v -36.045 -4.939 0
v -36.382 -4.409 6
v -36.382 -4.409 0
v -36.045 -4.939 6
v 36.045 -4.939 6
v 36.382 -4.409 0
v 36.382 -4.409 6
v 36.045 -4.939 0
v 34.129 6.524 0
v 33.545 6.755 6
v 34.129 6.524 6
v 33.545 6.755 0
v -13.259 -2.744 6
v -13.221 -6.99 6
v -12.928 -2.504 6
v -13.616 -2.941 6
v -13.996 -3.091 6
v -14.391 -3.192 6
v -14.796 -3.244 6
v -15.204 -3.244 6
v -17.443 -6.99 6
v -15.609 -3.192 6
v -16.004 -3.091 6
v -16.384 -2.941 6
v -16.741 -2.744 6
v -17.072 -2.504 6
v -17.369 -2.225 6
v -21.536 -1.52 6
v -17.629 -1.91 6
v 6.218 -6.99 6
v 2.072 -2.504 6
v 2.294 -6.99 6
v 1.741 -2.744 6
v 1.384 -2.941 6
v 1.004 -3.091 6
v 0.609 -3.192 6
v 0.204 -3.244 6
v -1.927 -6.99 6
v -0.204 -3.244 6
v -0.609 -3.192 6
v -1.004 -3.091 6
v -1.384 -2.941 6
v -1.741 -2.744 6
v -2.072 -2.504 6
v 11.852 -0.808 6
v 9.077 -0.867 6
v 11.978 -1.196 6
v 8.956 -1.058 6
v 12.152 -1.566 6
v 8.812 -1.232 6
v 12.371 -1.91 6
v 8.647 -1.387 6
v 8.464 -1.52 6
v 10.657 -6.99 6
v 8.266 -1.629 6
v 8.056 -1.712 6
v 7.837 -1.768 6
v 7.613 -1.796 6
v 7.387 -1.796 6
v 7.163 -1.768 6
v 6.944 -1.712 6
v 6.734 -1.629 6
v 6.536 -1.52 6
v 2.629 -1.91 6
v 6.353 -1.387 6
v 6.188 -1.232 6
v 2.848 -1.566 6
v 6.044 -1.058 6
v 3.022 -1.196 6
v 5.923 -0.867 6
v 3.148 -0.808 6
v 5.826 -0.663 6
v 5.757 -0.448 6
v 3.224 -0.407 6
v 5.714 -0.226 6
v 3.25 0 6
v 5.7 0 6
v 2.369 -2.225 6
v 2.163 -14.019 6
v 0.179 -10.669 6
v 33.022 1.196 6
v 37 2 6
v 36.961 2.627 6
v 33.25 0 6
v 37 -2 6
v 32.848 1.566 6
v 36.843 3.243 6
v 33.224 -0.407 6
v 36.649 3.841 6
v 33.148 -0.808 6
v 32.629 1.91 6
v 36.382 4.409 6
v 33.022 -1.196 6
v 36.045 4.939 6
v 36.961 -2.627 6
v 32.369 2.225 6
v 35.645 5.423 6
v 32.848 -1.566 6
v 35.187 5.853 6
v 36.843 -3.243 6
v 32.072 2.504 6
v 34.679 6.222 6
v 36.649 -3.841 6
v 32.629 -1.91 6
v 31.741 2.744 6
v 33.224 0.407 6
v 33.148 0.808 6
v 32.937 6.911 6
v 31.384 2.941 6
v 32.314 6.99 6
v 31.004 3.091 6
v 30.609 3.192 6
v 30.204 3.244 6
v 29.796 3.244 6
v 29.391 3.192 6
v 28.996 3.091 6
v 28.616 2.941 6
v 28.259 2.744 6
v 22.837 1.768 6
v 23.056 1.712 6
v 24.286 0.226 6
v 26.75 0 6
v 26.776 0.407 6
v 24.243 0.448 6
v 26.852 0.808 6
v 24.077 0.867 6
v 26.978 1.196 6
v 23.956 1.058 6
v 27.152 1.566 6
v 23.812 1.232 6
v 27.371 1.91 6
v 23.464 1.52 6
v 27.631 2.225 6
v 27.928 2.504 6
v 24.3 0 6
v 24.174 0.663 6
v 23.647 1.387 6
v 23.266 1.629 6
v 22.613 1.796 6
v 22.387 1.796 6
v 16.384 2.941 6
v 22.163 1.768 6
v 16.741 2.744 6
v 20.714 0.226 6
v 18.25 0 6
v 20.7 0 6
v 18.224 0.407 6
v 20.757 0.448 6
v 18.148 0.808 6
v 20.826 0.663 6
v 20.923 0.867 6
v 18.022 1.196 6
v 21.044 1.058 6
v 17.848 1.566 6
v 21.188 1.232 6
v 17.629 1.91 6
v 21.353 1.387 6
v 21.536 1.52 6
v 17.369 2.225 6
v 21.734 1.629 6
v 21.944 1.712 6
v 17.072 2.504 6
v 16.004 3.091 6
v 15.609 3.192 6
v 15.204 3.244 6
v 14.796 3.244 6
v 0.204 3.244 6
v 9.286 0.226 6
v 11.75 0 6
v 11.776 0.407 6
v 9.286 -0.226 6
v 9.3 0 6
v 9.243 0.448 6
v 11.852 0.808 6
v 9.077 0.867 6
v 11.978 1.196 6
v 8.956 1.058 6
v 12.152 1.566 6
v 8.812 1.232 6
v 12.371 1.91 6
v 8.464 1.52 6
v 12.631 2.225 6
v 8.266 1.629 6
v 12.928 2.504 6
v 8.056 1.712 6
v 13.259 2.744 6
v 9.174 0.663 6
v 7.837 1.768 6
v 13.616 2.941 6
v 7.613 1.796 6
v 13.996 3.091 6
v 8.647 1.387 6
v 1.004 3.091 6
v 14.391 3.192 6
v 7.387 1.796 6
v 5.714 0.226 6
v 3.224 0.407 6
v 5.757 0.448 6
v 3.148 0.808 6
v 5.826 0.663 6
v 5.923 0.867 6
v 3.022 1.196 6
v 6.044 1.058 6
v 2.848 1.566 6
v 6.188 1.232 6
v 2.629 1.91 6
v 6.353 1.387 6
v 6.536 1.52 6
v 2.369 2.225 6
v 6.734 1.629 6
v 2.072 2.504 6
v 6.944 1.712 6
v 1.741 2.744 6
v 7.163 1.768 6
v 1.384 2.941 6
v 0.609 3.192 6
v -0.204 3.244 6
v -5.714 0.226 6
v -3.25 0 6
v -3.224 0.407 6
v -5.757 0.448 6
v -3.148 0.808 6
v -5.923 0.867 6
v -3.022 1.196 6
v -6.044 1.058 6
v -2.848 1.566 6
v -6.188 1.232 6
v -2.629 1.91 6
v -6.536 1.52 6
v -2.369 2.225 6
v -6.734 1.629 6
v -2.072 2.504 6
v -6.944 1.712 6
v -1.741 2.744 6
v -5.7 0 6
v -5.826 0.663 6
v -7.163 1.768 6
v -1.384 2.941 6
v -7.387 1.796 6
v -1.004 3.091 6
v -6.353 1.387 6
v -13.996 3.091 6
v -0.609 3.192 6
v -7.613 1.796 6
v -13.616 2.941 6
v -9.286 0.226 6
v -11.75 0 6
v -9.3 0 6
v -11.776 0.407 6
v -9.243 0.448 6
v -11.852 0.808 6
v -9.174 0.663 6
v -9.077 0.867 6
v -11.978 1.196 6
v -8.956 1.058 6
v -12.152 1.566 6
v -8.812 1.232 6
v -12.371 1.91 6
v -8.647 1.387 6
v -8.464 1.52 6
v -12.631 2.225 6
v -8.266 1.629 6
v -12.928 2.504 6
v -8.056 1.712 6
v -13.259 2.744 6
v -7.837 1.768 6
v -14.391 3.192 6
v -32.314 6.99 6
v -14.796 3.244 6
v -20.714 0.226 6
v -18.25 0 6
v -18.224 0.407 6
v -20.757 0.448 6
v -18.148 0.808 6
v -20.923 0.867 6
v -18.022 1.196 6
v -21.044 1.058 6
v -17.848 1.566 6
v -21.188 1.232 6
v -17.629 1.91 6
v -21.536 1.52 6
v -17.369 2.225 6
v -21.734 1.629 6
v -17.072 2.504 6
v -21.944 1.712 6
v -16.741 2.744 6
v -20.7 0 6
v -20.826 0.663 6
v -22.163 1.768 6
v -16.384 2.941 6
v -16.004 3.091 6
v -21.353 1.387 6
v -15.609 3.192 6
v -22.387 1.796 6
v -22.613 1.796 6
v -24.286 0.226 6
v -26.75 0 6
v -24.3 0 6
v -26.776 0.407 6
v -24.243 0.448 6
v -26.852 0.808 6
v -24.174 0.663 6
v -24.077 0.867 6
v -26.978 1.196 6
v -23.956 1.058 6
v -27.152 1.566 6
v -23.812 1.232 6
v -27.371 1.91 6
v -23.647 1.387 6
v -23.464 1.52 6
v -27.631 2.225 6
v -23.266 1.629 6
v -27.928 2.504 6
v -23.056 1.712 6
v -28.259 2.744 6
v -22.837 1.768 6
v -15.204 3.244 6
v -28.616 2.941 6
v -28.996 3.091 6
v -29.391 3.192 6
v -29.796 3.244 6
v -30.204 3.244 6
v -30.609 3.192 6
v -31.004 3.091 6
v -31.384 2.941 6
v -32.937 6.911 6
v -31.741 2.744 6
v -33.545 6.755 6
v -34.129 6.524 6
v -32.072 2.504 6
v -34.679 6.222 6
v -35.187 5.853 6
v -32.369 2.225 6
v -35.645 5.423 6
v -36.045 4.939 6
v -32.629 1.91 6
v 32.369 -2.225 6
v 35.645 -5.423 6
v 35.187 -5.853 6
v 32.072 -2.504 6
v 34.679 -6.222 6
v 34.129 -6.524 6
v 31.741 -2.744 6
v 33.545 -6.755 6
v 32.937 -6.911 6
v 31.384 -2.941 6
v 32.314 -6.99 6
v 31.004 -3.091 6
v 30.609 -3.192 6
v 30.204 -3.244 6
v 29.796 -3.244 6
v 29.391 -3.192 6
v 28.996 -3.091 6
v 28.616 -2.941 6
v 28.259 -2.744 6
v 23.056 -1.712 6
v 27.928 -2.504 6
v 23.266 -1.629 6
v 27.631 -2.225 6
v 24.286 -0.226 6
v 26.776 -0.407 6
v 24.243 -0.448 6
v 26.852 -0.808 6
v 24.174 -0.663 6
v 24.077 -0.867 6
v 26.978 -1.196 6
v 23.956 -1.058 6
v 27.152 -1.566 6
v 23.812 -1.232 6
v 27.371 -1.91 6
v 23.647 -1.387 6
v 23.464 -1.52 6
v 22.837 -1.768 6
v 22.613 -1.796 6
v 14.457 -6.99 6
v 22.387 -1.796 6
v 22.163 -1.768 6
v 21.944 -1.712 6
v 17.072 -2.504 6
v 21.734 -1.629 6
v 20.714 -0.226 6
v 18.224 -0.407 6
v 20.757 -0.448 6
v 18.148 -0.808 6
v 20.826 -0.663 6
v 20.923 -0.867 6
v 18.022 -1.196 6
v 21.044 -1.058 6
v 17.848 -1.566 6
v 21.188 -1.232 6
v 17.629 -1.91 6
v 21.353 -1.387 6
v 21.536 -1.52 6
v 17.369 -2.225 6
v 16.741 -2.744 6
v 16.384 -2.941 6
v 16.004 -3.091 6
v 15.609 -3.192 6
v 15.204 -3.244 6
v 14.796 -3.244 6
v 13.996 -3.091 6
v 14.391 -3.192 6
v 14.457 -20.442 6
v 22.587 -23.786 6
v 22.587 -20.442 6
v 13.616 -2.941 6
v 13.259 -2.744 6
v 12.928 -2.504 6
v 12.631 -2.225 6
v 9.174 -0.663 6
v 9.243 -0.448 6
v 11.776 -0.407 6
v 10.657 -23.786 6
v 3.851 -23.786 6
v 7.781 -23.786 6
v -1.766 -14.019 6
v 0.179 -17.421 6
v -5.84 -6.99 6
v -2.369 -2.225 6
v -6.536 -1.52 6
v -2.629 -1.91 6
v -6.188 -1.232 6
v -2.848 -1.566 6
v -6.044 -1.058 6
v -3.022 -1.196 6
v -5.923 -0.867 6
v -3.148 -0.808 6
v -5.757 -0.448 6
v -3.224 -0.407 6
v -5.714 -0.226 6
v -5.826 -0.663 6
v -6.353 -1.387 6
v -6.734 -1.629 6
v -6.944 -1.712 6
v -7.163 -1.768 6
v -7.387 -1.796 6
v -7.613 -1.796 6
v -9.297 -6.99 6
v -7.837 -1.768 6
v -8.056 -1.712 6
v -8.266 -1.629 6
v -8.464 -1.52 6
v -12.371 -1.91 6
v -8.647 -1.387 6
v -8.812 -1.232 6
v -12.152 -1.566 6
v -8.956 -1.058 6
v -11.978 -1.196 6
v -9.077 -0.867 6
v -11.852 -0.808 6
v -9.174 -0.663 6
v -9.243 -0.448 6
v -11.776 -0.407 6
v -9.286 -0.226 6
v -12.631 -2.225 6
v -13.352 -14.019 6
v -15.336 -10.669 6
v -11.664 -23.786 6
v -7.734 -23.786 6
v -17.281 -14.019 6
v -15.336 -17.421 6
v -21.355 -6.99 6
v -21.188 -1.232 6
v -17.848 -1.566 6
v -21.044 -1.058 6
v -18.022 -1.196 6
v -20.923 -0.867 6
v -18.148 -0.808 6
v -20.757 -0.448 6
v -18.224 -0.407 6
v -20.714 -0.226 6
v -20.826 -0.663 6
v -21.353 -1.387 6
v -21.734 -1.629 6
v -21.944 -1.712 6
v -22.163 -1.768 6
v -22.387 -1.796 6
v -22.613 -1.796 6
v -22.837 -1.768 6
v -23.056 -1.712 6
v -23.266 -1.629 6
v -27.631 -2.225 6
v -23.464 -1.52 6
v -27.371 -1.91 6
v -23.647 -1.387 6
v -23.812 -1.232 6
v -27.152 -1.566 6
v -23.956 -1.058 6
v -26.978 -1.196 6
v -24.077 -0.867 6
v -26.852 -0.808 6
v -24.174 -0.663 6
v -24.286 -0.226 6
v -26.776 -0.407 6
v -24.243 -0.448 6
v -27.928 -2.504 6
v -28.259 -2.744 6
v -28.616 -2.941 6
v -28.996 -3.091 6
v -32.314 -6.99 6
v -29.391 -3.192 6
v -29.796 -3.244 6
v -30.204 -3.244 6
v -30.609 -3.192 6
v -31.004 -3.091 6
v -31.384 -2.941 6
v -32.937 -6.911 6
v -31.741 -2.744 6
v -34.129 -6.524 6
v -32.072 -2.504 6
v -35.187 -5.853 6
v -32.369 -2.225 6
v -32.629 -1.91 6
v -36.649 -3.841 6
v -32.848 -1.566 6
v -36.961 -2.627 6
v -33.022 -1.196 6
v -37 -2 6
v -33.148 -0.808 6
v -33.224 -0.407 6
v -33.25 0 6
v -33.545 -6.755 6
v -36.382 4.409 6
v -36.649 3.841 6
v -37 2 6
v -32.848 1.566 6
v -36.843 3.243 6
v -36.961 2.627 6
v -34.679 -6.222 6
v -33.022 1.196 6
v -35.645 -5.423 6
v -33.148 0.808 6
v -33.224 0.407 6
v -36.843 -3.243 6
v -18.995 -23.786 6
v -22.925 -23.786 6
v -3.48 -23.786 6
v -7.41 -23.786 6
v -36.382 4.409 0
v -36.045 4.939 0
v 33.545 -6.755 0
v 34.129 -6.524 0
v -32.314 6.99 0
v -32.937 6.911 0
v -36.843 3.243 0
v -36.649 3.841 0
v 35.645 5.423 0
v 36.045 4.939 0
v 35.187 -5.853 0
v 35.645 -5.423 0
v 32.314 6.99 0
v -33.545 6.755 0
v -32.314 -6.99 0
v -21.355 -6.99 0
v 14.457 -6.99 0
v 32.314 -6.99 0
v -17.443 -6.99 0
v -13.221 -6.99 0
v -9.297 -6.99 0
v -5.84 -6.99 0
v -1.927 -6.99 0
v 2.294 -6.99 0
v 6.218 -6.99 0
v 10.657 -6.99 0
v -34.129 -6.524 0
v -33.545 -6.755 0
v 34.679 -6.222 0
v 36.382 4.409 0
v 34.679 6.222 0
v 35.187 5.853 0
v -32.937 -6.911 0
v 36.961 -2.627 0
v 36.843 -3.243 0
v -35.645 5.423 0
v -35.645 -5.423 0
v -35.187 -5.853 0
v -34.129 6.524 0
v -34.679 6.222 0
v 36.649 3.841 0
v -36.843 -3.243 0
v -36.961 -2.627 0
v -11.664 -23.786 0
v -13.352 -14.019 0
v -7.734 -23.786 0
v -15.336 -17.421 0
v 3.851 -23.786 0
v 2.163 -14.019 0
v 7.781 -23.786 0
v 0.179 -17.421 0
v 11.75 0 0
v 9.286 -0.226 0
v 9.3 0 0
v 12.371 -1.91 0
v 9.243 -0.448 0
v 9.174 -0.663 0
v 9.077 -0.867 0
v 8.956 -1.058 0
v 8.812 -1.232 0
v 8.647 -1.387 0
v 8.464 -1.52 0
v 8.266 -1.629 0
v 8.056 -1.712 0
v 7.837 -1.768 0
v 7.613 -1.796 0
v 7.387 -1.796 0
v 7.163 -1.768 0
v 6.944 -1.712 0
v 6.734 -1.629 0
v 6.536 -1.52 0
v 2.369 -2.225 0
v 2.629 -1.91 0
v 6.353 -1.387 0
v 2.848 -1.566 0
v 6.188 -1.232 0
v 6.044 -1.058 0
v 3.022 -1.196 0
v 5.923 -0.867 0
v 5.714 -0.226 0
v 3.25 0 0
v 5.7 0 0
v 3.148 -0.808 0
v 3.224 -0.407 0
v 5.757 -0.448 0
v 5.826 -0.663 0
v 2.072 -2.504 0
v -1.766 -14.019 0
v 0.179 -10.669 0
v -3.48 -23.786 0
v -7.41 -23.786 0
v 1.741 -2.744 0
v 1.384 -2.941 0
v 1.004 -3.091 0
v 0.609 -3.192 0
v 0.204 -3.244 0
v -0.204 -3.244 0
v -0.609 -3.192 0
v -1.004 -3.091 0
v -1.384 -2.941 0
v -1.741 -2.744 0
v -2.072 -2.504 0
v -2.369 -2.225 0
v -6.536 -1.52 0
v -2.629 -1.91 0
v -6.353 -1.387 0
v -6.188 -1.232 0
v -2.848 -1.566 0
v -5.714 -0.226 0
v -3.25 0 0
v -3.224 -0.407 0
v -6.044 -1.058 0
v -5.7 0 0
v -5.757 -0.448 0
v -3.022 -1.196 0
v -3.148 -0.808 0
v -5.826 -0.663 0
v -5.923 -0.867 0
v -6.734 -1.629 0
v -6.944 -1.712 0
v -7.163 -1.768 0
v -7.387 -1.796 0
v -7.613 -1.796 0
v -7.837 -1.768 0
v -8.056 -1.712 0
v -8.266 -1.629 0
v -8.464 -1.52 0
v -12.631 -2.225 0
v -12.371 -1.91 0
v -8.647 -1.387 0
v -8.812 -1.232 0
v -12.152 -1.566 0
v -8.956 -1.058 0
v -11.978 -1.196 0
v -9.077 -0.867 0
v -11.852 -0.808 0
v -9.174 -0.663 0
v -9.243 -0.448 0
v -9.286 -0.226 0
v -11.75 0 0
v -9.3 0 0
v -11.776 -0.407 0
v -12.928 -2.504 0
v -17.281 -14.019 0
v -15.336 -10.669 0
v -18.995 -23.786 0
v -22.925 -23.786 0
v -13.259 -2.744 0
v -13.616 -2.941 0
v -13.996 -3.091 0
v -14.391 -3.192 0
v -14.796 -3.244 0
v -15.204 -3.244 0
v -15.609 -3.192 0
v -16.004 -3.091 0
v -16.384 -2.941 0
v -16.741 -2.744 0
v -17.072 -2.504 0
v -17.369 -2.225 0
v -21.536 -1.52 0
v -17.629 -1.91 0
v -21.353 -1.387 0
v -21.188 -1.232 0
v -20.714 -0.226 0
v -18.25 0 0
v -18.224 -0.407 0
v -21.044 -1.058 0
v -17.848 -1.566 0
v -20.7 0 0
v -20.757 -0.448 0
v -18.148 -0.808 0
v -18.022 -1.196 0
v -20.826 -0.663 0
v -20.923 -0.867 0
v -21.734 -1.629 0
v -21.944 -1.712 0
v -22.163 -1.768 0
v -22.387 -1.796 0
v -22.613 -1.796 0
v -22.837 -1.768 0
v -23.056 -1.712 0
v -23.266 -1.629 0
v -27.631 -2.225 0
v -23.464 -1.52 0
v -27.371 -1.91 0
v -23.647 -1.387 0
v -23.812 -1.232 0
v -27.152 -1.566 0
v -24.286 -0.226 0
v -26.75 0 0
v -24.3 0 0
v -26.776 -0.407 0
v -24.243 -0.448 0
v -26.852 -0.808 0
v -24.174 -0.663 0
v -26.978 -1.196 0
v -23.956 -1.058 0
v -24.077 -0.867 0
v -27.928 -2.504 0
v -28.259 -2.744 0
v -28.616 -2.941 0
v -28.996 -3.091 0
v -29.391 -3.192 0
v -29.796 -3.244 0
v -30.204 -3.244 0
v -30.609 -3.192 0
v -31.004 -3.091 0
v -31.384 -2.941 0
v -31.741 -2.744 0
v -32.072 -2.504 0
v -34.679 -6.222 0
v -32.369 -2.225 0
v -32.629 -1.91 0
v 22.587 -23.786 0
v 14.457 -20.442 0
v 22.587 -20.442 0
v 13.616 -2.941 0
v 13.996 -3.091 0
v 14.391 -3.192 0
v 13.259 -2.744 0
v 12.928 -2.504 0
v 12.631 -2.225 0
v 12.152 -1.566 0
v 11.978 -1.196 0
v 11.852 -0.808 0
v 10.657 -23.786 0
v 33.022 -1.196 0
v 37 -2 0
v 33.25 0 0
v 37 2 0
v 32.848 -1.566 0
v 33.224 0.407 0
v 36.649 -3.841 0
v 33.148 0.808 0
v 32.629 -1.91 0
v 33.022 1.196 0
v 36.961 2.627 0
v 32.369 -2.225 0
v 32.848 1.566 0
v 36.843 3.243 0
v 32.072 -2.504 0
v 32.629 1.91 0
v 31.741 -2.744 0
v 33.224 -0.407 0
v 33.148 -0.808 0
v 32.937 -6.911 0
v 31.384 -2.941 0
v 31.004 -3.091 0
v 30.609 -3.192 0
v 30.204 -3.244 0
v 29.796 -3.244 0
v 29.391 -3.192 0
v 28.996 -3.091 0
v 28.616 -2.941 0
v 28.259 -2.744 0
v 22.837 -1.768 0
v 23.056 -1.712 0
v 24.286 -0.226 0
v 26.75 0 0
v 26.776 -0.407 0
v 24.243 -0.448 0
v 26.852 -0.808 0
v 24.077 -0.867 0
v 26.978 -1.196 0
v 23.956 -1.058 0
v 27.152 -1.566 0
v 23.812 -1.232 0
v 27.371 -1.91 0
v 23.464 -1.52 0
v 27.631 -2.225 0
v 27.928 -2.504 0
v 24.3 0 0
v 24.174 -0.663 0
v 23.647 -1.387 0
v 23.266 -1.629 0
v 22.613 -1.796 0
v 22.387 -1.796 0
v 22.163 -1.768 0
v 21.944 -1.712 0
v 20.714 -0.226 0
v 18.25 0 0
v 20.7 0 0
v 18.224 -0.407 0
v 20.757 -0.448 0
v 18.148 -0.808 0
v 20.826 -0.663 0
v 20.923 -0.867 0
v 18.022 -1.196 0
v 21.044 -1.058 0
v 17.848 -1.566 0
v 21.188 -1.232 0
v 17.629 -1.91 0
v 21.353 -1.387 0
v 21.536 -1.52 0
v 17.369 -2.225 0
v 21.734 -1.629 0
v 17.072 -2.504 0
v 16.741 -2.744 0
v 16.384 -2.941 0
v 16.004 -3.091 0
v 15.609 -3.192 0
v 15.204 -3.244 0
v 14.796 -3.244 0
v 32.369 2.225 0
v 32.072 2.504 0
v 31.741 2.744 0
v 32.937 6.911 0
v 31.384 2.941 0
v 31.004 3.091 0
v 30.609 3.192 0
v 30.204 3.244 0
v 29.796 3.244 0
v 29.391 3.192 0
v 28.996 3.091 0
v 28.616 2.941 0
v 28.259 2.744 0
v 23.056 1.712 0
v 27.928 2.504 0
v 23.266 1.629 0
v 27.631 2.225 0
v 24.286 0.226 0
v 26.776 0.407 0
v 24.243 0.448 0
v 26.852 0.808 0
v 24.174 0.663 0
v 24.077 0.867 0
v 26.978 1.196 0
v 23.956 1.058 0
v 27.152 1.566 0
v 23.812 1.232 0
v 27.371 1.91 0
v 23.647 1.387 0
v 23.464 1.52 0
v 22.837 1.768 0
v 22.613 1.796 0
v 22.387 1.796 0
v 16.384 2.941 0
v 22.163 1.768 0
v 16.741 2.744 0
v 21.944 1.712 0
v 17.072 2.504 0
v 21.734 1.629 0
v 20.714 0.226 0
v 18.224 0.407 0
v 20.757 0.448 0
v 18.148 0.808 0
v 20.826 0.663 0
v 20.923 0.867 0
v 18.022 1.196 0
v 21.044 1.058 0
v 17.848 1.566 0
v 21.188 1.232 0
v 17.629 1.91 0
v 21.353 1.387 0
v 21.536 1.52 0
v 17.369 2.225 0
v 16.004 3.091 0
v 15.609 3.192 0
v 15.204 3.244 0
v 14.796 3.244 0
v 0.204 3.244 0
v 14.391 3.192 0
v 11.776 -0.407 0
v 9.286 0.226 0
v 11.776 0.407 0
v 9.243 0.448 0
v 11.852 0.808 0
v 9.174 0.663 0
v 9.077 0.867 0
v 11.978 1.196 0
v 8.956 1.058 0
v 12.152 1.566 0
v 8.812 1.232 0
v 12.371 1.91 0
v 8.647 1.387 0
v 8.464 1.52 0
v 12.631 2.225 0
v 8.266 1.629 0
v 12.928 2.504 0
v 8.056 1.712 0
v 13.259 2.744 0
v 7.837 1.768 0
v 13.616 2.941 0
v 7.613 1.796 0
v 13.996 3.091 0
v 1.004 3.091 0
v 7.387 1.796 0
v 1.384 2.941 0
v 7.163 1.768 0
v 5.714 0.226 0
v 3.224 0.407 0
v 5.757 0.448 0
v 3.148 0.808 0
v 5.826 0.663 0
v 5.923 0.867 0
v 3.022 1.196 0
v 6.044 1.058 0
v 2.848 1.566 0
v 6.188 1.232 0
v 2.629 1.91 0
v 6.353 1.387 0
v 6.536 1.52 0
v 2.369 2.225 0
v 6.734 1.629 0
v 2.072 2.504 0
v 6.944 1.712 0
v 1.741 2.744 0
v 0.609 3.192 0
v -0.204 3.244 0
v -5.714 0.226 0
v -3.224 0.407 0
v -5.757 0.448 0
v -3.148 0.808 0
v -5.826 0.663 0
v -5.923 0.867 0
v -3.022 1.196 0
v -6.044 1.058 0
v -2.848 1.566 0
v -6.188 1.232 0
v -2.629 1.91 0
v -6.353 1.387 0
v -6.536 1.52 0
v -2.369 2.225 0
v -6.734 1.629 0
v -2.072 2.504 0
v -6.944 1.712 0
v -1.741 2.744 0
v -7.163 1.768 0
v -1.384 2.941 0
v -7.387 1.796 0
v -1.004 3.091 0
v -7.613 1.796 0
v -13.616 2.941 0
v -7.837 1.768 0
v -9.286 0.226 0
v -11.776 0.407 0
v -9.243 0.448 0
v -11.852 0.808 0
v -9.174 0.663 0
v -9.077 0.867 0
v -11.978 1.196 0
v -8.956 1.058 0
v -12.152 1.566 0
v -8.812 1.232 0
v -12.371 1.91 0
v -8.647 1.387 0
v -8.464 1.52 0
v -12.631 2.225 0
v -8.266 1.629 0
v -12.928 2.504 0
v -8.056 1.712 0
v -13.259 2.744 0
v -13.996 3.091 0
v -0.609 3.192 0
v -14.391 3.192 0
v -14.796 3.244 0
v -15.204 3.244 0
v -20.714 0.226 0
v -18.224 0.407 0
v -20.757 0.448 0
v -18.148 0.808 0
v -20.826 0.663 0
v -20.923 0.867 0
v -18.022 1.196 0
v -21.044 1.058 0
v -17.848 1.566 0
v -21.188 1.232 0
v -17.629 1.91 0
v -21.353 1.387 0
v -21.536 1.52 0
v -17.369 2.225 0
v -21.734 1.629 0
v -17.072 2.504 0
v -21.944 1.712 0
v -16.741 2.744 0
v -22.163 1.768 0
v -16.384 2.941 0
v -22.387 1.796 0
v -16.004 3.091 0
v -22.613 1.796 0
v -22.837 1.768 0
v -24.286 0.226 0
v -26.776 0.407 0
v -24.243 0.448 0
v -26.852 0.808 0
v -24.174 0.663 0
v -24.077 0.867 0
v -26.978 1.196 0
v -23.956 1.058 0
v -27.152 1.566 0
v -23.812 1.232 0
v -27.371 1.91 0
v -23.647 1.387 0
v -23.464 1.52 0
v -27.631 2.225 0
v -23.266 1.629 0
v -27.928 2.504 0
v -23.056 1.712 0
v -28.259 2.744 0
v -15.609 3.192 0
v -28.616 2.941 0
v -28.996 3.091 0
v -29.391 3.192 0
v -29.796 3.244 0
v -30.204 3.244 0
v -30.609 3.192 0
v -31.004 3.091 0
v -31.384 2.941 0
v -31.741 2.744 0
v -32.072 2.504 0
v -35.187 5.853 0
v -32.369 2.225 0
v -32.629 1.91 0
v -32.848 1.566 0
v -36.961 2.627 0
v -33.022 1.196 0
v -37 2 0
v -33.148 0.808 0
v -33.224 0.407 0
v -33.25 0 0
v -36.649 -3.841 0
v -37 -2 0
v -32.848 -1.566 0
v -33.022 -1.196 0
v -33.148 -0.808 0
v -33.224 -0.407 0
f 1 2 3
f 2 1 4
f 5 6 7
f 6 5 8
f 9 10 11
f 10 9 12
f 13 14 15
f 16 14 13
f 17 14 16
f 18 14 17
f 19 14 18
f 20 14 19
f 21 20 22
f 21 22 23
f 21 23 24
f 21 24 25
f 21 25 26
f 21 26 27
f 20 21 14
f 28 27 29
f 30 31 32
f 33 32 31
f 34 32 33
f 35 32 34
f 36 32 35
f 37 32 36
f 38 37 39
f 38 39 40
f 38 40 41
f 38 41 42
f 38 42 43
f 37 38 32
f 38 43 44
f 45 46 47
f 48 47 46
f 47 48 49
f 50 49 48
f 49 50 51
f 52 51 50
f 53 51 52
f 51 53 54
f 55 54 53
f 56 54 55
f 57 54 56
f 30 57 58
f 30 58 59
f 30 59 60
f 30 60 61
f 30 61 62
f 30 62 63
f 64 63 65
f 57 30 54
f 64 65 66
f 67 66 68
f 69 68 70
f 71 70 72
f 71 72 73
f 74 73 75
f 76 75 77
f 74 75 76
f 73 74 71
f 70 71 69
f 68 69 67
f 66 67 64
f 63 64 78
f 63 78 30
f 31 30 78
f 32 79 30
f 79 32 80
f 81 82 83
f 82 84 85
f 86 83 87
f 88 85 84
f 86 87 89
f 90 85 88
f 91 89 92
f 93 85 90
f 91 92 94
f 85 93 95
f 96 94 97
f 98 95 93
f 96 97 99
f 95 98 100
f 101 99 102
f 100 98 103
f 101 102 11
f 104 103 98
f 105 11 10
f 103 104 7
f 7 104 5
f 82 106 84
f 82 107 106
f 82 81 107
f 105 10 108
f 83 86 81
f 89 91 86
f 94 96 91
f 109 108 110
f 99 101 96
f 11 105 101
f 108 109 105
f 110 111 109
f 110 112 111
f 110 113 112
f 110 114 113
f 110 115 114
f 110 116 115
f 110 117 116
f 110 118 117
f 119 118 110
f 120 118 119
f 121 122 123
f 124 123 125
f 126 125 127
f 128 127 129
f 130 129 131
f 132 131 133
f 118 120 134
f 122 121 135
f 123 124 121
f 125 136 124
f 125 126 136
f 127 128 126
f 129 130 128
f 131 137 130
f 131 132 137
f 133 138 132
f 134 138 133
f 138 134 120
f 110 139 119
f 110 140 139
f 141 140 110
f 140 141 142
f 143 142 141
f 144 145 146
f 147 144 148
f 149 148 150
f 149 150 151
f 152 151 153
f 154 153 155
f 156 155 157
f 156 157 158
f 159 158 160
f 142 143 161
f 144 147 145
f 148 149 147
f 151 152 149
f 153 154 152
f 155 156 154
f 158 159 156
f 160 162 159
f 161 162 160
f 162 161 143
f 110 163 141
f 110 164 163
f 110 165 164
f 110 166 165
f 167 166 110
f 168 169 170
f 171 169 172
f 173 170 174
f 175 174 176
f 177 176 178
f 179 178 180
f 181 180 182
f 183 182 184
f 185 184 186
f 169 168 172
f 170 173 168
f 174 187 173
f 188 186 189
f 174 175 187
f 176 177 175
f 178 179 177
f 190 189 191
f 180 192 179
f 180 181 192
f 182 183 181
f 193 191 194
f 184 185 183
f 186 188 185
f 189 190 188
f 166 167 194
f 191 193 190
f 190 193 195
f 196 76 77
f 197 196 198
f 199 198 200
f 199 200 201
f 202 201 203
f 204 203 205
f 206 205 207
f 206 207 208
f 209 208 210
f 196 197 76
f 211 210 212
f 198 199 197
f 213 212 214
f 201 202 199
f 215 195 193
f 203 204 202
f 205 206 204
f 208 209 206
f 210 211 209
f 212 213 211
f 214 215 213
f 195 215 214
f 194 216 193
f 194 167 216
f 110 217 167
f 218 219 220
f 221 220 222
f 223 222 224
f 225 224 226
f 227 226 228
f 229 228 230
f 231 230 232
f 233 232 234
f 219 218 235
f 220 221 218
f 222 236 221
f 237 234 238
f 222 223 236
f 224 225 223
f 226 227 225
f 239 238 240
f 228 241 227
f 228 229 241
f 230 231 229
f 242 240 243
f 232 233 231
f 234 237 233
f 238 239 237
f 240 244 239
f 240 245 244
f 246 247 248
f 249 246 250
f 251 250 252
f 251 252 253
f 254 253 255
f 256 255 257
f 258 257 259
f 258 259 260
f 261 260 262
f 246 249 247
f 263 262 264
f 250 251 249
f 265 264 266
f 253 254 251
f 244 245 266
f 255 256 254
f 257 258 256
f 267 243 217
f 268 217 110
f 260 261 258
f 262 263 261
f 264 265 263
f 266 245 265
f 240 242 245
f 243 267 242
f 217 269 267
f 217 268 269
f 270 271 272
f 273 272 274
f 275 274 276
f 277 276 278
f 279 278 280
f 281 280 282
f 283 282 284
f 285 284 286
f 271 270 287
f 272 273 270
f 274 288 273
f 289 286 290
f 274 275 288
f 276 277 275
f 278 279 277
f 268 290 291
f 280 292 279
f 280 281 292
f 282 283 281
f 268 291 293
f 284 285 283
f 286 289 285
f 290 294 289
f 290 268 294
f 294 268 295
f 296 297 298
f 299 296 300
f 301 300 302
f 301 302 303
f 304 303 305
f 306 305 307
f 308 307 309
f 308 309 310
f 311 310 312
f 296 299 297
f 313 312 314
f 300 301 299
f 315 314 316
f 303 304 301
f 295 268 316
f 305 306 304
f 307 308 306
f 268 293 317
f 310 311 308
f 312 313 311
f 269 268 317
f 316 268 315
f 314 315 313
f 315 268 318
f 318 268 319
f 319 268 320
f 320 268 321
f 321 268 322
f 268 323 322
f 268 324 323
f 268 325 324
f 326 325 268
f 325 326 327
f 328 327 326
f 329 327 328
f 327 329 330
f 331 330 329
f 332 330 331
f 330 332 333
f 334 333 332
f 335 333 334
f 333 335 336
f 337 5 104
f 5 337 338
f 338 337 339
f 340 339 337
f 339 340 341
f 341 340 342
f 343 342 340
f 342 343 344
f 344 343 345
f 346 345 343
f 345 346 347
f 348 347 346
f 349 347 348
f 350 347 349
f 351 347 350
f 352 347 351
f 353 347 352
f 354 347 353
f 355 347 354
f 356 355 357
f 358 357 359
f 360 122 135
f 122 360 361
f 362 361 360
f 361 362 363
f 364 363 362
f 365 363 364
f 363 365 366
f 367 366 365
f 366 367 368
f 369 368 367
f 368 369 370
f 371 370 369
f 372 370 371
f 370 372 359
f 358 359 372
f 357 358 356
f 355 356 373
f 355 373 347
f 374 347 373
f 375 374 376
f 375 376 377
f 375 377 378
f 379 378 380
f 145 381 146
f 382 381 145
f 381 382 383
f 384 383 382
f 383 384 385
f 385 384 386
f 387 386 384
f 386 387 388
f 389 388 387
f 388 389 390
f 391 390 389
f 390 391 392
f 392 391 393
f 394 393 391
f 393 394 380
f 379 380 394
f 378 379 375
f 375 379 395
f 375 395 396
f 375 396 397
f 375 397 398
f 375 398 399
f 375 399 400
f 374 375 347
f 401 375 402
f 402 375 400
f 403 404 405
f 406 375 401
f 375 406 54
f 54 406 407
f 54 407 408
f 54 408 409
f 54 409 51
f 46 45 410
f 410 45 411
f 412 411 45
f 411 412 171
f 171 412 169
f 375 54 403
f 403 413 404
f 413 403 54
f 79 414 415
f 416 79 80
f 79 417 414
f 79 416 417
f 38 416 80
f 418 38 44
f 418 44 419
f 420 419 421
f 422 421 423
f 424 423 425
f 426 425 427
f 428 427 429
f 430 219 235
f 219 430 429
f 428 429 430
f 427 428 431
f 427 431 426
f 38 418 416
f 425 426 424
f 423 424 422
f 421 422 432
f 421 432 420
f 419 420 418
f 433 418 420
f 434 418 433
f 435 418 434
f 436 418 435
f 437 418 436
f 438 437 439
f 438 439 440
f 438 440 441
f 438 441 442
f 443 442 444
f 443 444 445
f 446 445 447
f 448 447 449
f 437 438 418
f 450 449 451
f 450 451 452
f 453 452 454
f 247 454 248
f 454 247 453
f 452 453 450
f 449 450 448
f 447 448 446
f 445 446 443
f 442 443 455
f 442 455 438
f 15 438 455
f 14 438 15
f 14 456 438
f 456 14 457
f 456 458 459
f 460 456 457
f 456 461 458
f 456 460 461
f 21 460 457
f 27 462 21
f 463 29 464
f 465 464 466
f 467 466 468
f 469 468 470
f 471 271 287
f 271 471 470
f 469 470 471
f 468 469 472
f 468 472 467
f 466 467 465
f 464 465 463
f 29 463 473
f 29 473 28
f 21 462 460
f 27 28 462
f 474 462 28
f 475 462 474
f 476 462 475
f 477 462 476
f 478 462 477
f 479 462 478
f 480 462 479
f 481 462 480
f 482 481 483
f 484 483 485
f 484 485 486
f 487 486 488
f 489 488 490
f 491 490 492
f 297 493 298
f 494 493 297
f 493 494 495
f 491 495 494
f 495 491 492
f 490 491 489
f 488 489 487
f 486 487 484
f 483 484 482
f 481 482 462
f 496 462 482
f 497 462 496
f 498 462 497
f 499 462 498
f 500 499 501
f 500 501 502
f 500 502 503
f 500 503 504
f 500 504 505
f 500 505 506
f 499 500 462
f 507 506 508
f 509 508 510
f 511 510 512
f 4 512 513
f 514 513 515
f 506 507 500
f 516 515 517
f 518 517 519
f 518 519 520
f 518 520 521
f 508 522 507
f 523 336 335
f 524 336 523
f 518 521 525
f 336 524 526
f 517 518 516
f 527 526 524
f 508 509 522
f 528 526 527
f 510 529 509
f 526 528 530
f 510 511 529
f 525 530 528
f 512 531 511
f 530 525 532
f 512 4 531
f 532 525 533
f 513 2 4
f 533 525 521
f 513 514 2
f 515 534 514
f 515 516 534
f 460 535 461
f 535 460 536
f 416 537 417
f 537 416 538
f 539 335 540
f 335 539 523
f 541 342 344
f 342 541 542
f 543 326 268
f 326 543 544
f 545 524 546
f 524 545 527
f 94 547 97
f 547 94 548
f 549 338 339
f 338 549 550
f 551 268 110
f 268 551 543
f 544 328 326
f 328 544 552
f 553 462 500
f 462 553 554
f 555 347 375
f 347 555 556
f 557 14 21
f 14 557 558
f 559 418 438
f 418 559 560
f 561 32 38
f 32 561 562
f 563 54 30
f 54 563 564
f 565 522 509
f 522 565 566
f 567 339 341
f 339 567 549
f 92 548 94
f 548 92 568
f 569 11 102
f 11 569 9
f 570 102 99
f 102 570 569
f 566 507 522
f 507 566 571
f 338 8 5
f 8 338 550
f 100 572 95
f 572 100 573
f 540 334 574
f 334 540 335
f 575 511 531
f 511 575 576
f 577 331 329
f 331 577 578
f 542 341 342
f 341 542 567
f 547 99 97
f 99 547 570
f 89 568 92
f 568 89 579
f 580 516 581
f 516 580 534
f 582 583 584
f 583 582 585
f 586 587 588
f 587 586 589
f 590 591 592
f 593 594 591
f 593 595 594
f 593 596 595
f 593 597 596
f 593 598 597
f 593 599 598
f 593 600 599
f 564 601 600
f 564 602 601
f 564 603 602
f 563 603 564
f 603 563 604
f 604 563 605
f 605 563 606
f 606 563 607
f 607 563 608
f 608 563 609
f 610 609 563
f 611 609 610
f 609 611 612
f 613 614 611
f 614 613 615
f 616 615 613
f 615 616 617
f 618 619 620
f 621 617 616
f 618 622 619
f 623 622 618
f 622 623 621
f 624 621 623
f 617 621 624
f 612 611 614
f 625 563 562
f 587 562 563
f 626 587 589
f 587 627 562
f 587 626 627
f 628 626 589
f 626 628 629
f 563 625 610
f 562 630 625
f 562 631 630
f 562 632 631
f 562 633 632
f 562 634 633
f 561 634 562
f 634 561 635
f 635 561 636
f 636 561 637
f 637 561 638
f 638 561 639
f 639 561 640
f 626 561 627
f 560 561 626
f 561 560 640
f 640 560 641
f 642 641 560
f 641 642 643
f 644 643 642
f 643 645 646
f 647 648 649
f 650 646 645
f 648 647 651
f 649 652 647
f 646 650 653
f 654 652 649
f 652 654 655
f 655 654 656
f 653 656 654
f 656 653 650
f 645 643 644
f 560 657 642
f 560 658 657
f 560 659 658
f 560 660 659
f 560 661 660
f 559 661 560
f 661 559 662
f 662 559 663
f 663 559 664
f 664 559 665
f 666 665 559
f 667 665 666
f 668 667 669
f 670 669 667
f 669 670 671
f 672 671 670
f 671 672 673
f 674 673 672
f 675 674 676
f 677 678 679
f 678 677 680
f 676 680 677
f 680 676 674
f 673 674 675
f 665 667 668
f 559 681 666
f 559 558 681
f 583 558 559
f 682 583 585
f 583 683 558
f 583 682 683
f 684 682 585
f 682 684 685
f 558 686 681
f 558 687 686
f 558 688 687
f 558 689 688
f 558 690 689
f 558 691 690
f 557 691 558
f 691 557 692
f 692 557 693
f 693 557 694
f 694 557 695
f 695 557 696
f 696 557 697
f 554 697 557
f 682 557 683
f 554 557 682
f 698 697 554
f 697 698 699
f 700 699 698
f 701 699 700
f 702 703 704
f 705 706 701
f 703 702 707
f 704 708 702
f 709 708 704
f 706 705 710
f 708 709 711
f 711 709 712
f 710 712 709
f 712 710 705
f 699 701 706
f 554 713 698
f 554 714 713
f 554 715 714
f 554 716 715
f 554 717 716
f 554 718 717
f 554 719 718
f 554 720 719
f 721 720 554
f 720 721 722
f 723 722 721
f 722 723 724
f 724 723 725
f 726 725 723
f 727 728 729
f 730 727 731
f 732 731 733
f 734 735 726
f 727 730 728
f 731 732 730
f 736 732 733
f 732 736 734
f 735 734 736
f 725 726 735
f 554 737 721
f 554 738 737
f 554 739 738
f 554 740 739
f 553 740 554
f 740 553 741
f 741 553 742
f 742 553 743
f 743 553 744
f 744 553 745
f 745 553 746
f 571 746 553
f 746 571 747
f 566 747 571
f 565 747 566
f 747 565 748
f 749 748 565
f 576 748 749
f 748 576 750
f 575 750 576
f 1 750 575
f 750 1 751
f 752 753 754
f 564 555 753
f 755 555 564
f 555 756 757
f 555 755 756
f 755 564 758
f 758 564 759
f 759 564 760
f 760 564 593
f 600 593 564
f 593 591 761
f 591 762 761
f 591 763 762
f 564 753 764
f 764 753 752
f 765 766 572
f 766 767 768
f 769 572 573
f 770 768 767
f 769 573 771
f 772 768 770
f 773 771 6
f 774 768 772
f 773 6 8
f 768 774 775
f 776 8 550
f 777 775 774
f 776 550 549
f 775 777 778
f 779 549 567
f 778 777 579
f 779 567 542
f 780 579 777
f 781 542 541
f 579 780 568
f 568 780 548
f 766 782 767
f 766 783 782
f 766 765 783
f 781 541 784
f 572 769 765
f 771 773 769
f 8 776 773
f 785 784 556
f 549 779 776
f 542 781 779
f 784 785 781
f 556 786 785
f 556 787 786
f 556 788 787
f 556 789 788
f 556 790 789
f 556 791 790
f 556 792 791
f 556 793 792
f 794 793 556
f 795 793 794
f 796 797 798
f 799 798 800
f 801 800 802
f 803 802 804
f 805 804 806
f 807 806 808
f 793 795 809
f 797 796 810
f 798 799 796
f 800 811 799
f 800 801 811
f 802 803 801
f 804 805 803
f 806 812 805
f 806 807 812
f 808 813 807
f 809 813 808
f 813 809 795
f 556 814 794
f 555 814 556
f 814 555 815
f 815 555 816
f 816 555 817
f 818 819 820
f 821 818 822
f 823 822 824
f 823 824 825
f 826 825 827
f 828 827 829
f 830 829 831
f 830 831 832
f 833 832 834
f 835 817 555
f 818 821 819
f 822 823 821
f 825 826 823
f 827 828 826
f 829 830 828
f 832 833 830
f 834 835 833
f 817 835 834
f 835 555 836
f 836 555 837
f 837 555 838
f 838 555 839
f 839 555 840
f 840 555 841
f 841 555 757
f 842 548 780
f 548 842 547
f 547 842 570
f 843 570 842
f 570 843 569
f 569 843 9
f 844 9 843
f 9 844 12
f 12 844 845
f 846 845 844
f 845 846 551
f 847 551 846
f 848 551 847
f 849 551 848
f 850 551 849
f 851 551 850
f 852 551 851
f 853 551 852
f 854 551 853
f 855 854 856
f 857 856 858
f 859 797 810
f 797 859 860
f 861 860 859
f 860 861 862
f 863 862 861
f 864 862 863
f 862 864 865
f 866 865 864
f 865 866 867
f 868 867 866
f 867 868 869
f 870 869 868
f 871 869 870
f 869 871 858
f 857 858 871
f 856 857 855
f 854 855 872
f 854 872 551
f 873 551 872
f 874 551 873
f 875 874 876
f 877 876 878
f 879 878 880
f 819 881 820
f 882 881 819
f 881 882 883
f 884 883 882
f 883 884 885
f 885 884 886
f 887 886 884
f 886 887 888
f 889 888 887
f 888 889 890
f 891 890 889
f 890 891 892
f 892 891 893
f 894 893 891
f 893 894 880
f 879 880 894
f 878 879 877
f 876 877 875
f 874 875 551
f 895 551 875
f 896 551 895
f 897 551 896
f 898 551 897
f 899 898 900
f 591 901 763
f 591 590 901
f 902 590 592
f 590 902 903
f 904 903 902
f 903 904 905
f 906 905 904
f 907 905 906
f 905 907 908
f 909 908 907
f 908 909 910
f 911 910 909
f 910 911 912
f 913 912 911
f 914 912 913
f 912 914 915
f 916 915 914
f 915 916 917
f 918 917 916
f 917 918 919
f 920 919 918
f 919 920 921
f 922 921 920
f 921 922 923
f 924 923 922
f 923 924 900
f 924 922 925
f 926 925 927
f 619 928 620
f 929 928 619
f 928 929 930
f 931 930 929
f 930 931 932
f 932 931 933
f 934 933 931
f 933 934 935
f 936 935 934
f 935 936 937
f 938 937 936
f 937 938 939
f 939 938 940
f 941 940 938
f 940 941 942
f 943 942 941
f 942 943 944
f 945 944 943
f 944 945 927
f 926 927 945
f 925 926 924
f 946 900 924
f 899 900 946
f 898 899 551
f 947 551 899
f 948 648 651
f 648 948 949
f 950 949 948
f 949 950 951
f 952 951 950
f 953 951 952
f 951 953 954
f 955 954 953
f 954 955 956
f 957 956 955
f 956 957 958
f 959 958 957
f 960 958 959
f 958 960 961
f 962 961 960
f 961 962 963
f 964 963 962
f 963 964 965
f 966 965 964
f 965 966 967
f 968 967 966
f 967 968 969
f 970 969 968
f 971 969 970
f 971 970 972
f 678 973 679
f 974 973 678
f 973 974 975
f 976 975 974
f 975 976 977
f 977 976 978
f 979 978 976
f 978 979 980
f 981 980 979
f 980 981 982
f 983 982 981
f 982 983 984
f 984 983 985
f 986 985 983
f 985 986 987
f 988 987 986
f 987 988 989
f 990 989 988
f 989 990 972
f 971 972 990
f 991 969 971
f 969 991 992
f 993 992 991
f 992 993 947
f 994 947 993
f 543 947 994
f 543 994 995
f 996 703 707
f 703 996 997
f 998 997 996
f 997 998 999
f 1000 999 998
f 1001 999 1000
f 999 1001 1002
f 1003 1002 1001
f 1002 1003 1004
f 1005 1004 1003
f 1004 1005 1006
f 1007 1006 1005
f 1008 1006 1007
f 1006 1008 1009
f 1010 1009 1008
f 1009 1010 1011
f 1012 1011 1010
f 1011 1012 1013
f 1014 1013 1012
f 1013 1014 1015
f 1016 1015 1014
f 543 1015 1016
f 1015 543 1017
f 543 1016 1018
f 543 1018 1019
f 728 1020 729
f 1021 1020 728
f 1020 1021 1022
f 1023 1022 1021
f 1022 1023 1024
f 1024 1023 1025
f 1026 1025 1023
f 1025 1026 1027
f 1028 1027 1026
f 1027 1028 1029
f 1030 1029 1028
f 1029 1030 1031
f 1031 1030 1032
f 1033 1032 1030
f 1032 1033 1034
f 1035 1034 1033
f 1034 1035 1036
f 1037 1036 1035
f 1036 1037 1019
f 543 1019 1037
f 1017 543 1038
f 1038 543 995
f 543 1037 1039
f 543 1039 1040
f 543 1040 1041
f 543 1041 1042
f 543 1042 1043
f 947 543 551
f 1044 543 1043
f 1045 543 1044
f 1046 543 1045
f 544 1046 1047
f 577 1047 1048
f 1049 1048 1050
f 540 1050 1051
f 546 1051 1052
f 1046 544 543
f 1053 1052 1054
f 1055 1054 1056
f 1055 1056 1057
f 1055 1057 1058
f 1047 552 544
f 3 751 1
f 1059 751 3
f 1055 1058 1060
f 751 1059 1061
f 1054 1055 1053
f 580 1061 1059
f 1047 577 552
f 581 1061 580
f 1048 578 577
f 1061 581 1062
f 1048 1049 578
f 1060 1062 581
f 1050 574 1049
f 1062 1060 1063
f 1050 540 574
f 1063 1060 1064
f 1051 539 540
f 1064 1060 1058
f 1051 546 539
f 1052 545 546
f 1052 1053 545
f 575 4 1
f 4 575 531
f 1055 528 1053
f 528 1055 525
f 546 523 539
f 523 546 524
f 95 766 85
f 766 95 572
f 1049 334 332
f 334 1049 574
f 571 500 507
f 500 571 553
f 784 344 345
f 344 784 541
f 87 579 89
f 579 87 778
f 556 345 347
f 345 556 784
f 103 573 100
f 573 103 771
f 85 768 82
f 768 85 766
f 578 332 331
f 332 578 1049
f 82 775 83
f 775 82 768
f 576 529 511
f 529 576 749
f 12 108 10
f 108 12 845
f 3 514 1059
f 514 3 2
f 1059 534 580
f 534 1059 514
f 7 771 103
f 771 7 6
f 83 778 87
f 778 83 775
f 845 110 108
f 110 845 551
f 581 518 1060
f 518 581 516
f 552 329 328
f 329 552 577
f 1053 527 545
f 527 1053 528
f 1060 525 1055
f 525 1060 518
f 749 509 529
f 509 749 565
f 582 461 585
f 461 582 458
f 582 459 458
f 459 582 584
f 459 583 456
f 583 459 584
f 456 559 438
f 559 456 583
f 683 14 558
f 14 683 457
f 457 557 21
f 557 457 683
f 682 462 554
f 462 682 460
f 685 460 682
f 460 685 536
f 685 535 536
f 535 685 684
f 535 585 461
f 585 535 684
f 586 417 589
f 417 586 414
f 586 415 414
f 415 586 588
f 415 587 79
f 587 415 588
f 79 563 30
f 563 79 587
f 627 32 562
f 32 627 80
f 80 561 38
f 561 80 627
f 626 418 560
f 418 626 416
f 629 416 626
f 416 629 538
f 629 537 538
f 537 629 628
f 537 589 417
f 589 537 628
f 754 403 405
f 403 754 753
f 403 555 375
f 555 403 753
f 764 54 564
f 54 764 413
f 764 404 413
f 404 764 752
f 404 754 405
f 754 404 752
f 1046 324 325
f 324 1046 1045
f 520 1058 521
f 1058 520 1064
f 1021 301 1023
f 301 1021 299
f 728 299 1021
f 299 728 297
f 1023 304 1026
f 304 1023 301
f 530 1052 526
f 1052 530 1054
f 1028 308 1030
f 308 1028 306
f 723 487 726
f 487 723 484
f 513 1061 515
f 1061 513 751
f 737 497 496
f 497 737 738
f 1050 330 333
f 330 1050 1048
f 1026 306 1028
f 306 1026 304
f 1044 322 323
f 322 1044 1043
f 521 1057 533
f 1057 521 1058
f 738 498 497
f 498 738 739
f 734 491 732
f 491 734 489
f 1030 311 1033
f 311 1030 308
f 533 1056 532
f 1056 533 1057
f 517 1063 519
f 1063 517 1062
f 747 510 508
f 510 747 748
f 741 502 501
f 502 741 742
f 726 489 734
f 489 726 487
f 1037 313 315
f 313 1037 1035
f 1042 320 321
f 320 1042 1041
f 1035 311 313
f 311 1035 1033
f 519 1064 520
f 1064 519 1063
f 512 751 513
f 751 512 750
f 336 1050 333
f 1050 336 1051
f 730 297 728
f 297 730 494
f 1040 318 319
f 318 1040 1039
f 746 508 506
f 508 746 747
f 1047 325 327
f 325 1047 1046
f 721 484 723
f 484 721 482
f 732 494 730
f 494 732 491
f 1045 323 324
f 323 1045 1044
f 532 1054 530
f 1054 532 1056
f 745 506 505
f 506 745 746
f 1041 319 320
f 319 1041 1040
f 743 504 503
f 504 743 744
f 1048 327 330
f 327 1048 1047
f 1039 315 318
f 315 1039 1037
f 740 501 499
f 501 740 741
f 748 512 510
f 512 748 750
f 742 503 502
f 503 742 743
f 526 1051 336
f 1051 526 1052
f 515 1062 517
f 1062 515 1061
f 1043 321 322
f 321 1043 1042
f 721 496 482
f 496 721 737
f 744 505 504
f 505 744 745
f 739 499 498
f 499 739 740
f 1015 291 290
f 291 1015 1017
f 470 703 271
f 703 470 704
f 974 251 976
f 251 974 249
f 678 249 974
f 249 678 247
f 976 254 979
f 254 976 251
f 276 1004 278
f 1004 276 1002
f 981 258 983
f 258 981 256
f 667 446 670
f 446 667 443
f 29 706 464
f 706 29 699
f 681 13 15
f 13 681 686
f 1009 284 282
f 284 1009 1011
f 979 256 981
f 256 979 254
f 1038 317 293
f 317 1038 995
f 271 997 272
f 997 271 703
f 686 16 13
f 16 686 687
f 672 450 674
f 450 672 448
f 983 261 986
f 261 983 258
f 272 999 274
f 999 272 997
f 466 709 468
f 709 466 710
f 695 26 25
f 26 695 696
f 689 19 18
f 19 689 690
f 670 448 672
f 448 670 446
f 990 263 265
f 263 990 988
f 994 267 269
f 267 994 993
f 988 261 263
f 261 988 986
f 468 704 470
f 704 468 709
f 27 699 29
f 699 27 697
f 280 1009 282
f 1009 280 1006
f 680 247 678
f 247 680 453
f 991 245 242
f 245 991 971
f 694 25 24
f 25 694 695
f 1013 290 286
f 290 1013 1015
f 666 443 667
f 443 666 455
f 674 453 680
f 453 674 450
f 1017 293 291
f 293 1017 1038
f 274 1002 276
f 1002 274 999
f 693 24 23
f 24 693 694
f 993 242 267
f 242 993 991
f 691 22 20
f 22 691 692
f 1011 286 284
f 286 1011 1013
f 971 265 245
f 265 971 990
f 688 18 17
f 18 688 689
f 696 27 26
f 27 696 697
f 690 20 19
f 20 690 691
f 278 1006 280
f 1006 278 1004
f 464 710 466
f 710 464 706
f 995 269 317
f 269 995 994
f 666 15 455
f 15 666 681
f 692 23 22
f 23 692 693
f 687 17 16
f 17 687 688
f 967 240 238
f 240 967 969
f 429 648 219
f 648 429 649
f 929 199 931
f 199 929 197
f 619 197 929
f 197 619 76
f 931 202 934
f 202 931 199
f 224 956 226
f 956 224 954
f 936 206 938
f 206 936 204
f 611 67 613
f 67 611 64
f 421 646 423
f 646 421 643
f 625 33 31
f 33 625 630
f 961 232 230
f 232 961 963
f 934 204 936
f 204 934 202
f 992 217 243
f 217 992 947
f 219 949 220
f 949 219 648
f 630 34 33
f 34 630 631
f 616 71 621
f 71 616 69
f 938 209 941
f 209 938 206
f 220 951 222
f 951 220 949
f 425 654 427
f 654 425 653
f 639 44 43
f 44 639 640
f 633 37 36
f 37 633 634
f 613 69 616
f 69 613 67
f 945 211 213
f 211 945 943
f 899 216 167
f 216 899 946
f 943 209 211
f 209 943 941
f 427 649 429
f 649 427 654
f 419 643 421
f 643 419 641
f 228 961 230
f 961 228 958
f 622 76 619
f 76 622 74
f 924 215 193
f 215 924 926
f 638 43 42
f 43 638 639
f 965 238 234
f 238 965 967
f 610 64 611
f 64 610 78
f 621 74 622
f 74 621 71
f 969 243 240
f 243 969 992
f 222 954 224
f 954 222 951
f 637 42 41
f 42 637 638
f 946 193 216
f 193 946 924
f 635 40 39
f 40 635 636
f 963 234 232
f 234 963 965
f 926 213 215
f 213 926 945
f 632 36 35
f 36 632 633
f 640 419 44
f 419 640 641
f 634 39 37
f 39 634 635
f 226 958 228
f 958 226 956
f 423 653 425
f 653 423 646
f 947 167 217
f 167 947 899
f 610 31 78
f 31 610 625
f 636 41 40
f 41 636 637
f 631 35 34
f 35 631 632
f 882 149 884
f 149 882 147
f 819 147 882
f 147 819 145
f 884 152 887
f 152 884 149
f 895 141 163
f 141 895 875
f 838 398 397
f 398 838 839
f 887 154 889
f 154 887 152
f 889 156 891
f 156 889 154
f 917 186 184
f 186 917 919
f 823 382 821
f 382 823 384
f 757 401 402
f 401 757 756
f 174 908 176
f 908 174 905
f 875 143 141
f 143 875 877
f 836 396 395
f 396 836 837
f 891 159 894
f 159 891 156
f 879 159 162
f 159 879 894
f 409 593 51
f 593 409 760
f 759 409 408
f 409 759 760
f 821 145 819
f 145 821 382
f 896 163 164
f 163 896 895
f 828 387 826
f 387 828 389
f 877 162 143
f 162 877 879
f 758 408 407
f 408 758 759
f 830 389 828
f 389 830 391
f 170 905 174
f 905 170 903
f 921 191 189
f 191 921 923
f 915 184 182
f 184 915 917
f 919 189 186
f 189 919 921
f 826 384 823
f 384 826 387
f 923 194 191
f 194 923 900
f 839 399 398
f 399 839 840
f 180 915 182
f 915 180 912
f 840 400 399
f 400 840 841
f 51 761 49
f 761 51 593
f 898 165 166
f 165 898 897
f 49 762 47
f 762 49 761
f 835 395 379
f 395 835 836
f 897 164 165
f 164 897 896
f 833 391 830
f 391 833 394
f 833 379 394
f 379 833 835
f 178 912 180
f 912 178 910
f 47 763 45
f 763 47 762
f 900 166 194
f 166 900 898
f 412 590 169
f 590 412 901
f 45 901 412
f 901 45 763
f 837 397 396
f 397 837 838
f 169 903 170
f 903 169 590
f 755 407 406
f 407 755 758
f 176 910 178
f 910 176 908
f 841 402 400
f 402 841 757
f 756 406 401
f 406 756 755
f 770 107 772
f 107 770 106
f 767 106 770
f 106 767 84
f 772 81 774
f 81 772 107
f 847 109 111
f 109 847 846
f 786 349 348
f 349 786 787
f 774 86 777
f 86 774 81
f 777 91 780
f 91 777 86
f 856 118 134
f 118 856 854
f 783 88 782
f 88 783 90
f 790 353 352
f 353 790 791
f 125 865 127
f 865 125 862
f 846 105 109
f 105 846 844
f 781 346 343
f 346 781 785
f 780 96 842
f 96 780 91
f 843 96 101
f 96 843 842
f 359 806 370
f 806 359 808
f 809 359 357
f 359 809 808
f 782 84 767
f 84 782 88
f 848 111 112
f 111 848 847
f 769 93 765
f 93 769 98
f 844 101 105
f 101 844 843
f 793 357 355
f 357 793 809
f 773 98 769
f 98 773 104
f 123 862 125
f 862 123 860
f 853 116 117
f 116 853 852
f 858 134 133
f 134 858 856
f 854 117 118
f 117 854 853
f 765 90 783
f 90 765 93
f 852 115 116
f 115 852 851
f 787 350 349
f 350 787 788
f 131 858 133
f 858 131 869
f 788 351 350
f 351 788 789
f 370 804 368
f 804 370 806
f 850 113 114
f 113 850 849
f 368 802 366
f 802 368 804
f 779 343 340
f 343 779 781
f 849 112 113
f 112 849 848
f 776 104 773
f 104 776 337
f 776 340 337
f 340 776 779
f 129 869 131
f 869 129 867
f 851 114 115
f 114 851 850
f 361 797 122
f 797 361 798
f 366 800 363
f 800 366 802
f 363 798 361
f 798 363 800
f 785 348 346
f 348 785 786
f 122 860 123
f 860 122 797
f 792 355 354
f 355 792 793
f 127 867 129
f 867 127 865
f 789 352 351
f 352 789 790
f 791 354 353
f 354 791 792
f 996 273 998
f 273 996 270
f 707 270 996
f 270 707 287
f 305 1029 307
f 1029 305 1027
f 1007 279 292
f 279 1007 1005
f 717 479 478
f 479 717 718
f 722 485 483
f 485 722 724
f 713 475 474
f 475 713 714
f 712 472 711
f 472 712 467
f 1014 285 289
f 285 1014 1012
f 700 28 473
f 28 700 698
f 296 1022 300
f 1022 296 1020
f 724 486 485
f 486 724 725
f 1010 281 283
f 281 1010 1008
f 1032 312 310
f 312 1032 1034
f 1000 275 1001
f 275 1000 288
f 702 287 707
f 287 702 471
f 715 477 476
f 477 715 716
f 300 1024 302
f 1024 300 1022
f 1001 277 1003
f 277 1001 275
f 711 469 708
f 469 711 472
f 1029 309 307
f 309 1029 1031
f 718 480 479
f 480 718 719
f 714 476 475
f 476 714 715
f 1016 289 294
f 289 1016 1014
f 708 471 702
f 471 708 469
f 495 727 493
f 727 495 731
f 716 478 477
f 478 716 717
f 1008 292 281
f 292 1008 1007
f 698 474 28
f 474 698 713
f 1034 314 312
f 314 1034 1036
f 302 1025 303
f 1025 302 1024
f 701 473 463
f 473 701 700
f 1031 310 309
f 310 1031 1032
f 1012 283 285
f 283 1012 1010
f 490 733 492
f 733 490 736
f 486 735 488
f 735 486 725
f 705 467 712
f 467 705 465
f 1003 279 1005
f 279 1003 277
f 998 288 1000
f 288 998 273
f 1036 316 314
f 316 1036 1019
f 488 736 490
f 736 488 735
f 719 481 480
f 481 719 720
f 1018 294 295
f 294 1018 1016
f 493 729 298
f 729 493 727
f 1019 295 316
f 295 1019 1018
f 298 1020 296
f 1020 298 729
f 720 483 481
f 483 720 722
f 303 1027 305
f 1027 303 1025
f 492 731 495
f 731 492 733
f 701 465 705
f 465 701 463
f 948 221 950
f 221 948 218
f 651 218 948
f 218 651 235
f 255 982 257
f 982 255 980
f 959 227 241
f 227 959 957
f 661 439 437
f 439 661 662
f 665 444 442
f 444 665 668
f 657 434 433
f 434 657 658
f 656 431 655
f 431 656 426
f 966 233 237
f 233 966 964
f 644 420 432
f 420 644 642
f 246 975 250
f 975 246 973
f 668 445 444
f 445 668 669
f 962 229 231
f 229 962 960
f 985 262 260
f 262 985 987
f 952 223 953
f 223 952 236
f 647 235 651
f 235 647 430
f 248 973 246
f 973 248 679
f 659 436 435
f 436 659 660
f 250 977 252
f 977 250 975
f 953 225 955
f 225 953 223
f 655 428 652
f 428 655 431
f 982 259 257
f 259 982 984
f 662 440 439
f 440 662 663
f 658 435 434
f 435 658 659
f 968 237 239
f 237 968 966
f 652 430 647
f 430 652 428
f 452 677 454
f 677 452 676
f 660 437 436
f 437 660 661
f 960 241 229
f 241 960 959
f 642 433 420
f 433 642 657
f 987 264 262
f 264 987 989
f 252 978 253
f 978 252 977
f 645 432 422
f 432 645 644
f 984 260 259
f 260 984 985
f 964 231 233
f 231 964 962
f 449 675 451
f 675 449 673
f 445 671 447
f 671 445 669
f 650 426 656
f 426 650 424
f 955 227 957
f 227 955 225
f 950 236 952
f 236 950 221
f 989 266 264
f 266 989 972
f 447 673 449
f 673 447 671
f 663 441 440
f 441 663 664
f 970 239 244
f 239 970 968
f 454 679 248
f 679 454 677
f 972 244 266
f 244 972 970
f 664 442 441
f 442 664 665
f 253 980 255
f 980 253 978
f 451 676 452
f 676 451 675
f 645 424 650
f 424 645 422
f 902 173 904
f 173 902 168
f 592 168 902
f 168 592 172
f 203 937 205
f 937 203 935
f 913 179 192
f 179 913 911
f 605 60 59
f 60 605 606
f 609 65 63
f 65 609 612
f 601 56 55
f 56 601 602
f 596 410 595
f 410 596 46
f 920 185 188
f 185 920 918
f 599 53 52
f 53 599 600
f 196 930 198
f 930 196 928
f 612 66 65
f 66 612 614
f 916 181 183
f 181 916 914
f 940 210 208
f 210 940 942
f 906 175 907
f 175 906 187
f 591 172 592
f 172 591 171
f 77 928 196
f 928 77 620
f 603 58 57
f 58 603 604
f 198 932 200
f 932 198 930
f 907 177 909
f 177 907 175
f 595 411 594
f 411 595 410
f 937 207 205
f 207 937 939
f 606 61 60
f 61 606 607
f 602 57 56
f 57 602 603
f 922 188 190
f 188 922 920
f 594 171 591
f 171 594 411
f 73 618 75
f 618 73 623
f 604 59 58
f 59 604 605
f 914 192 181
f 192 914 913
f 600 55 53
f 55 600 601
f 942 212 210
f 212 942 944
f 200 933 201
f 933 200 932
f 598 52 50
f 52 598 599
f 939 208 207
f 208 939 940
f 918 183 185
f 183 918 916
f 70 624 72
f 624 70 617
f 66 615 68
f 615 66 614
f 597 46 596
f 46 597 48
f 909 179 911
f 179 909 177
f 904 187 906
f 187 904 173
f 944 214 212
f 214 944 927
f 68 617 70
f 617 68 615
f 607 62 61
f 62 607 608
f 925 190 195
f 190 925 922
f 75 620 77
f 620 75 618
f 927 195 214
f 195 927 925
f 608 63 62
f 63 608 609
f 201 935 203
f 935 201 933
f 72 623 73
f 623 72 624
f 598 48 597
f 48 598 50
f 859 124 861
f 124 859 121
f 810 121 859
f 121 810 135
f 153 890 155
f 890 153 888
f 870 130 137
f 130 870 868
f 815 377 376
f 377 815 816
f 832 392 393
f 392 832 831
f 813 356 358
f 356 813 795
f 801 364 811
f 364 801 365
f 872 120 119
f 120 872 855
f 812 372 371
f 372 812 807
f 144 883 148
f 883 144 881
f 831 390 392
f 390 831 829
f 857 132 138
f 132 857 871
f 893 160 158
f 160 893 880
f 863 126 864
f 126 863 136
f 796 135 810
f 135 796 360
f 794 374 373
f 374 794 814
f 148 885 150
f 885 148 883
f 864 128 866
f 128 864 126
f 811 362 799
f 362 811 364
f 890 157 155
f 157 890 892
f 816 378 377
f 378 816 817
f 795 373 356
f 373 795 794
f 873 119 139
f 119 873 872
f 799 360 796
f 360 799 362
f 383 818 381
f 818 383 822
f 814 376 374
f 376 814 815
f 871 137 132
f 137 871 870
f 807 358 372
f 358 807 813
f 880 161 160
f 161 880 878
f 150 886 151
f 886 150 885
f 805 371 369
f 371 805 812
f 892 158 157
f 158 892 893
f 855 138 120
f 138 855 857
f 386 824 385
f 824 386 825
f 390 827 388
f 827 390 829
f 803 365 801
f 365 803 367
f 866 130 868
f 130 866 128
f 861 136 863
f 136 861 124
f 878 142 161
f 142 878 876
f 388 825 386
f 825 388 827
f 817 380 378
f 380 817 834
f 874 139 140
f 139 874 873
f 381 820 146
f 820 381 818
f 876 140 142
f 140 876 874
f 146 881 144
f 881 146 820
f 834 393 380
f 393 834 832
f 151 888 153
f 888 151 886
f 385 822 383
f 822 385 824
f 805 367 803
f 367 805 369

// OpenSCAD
$fn = 50;


difference() {
	union() {
		hull() {
			translate(v = [-32.0000000000, 2.0000000000, 0]) {
				cylinder(h = 6, r = 5);
			}
			translate(v = [32.0000000000, 2.0000000000, 0]) {
				cylinder(h = 6, r = 5);
			}
			translate(v = [-32.0000000000, -2.0000000000, 0]) {
				cylinder(h = 6, r = 5);
			}
			translate(v = [32.0000000000, -2.0000000000, 0]) {
				cylinder(h = 6, r = 5);
			}
		}
		translate(v = [0, -5, 0]) {
			linear_extrude(height = 6) {
				text(font = "DejaVu Sans Mono:style=Bold", halign = "center", size = 19.0000000000, text = "XXL", valign = "top");
			}
		}
	}
	union() {
		translate(v = [-30.0000000000, 0.0000000000, 0]) {
			translate(v = [0, 0, -100]) {
				cylinder(h = 200, r = 3.2500000000);
			}
		}
		translate(v = [-15.0000000000, 0.0000000000, 0]) {
			translate(v = [0, 0, -100]) {
				cylinder(h = 200, r = 3.2500000000);
			}
		}
		translate(v = [0, 0, -100]) {
			cylinder(h = 200, r = 3.2500000000);
		}
		translate(v = [15.0000000000, 0.0000000000, 0]) {
			translate(v = [0, 0, -100]) {
				cylinder(h = 200, r = 3.2500000000);
			}
		}
		translate(v = [30.0000000000, 0.0000000000, 0]) {
			translate(v = [0, 0, -100]) {
				cylinder(h = 200, r = 3.2500000000);
			}
		}
		translate(v = [-30.0000000000, 0.0000000000, 0]) {
			translate(v = [0, 0, -100]) {
				cylinder(h = 200, r = 1.8000000000);
			}
		}
		translate(v = [-22.5000000000, 0.0000000000, 0]) {
			translate(v = [0, 0, -100]) {
				cylinder(h = 200, r = 1.8000000000);
			}
		}
		translate(v = [-15.0000000000, 0.0000000000, 0]) {
			translate(v = [0, 0, -100]) {
				cylinder(h = 200, r = 1.8000000000);
			}
		}
		translate(v = [-7.5000000000, 0.0000000000, 0]) {
			translate(v = [0, 0, -100]) {
				cylinder(h = 200, r = 1.8000000000);
			}
		}
		translate(v = [0, 0, -100]) {
			cylinder(h = 200, r = 1.8000000000);
		}
		translate(v = [7.5000000000, 0.0000000000, 0]) {
			translate(v = [0, 0, -100]) {
				cylinder(h = 200, r = 1.8000000000);
			}
		}
		translate(v = [15.0000000000, 0.0000000000, 0]) {
			translate(v = [0, 0, -100]) {
				cylinder(h = 200, r = 1.8000000000);
			}
		}
		translate(v = [22.5000000000, 0.0000000000, 0]) {
			translate(v = [0, 0, -100]) {
				cylinder(h = 200, r = 1.8000000000);
			}
		}
		translate(v = [30.0000000000, 0.0000000000, 0]) {
			translate(v = [0, 0, -100]) {
				cylinder(h = 200, r = 1.8000000000);
			}
		}
	}
}
